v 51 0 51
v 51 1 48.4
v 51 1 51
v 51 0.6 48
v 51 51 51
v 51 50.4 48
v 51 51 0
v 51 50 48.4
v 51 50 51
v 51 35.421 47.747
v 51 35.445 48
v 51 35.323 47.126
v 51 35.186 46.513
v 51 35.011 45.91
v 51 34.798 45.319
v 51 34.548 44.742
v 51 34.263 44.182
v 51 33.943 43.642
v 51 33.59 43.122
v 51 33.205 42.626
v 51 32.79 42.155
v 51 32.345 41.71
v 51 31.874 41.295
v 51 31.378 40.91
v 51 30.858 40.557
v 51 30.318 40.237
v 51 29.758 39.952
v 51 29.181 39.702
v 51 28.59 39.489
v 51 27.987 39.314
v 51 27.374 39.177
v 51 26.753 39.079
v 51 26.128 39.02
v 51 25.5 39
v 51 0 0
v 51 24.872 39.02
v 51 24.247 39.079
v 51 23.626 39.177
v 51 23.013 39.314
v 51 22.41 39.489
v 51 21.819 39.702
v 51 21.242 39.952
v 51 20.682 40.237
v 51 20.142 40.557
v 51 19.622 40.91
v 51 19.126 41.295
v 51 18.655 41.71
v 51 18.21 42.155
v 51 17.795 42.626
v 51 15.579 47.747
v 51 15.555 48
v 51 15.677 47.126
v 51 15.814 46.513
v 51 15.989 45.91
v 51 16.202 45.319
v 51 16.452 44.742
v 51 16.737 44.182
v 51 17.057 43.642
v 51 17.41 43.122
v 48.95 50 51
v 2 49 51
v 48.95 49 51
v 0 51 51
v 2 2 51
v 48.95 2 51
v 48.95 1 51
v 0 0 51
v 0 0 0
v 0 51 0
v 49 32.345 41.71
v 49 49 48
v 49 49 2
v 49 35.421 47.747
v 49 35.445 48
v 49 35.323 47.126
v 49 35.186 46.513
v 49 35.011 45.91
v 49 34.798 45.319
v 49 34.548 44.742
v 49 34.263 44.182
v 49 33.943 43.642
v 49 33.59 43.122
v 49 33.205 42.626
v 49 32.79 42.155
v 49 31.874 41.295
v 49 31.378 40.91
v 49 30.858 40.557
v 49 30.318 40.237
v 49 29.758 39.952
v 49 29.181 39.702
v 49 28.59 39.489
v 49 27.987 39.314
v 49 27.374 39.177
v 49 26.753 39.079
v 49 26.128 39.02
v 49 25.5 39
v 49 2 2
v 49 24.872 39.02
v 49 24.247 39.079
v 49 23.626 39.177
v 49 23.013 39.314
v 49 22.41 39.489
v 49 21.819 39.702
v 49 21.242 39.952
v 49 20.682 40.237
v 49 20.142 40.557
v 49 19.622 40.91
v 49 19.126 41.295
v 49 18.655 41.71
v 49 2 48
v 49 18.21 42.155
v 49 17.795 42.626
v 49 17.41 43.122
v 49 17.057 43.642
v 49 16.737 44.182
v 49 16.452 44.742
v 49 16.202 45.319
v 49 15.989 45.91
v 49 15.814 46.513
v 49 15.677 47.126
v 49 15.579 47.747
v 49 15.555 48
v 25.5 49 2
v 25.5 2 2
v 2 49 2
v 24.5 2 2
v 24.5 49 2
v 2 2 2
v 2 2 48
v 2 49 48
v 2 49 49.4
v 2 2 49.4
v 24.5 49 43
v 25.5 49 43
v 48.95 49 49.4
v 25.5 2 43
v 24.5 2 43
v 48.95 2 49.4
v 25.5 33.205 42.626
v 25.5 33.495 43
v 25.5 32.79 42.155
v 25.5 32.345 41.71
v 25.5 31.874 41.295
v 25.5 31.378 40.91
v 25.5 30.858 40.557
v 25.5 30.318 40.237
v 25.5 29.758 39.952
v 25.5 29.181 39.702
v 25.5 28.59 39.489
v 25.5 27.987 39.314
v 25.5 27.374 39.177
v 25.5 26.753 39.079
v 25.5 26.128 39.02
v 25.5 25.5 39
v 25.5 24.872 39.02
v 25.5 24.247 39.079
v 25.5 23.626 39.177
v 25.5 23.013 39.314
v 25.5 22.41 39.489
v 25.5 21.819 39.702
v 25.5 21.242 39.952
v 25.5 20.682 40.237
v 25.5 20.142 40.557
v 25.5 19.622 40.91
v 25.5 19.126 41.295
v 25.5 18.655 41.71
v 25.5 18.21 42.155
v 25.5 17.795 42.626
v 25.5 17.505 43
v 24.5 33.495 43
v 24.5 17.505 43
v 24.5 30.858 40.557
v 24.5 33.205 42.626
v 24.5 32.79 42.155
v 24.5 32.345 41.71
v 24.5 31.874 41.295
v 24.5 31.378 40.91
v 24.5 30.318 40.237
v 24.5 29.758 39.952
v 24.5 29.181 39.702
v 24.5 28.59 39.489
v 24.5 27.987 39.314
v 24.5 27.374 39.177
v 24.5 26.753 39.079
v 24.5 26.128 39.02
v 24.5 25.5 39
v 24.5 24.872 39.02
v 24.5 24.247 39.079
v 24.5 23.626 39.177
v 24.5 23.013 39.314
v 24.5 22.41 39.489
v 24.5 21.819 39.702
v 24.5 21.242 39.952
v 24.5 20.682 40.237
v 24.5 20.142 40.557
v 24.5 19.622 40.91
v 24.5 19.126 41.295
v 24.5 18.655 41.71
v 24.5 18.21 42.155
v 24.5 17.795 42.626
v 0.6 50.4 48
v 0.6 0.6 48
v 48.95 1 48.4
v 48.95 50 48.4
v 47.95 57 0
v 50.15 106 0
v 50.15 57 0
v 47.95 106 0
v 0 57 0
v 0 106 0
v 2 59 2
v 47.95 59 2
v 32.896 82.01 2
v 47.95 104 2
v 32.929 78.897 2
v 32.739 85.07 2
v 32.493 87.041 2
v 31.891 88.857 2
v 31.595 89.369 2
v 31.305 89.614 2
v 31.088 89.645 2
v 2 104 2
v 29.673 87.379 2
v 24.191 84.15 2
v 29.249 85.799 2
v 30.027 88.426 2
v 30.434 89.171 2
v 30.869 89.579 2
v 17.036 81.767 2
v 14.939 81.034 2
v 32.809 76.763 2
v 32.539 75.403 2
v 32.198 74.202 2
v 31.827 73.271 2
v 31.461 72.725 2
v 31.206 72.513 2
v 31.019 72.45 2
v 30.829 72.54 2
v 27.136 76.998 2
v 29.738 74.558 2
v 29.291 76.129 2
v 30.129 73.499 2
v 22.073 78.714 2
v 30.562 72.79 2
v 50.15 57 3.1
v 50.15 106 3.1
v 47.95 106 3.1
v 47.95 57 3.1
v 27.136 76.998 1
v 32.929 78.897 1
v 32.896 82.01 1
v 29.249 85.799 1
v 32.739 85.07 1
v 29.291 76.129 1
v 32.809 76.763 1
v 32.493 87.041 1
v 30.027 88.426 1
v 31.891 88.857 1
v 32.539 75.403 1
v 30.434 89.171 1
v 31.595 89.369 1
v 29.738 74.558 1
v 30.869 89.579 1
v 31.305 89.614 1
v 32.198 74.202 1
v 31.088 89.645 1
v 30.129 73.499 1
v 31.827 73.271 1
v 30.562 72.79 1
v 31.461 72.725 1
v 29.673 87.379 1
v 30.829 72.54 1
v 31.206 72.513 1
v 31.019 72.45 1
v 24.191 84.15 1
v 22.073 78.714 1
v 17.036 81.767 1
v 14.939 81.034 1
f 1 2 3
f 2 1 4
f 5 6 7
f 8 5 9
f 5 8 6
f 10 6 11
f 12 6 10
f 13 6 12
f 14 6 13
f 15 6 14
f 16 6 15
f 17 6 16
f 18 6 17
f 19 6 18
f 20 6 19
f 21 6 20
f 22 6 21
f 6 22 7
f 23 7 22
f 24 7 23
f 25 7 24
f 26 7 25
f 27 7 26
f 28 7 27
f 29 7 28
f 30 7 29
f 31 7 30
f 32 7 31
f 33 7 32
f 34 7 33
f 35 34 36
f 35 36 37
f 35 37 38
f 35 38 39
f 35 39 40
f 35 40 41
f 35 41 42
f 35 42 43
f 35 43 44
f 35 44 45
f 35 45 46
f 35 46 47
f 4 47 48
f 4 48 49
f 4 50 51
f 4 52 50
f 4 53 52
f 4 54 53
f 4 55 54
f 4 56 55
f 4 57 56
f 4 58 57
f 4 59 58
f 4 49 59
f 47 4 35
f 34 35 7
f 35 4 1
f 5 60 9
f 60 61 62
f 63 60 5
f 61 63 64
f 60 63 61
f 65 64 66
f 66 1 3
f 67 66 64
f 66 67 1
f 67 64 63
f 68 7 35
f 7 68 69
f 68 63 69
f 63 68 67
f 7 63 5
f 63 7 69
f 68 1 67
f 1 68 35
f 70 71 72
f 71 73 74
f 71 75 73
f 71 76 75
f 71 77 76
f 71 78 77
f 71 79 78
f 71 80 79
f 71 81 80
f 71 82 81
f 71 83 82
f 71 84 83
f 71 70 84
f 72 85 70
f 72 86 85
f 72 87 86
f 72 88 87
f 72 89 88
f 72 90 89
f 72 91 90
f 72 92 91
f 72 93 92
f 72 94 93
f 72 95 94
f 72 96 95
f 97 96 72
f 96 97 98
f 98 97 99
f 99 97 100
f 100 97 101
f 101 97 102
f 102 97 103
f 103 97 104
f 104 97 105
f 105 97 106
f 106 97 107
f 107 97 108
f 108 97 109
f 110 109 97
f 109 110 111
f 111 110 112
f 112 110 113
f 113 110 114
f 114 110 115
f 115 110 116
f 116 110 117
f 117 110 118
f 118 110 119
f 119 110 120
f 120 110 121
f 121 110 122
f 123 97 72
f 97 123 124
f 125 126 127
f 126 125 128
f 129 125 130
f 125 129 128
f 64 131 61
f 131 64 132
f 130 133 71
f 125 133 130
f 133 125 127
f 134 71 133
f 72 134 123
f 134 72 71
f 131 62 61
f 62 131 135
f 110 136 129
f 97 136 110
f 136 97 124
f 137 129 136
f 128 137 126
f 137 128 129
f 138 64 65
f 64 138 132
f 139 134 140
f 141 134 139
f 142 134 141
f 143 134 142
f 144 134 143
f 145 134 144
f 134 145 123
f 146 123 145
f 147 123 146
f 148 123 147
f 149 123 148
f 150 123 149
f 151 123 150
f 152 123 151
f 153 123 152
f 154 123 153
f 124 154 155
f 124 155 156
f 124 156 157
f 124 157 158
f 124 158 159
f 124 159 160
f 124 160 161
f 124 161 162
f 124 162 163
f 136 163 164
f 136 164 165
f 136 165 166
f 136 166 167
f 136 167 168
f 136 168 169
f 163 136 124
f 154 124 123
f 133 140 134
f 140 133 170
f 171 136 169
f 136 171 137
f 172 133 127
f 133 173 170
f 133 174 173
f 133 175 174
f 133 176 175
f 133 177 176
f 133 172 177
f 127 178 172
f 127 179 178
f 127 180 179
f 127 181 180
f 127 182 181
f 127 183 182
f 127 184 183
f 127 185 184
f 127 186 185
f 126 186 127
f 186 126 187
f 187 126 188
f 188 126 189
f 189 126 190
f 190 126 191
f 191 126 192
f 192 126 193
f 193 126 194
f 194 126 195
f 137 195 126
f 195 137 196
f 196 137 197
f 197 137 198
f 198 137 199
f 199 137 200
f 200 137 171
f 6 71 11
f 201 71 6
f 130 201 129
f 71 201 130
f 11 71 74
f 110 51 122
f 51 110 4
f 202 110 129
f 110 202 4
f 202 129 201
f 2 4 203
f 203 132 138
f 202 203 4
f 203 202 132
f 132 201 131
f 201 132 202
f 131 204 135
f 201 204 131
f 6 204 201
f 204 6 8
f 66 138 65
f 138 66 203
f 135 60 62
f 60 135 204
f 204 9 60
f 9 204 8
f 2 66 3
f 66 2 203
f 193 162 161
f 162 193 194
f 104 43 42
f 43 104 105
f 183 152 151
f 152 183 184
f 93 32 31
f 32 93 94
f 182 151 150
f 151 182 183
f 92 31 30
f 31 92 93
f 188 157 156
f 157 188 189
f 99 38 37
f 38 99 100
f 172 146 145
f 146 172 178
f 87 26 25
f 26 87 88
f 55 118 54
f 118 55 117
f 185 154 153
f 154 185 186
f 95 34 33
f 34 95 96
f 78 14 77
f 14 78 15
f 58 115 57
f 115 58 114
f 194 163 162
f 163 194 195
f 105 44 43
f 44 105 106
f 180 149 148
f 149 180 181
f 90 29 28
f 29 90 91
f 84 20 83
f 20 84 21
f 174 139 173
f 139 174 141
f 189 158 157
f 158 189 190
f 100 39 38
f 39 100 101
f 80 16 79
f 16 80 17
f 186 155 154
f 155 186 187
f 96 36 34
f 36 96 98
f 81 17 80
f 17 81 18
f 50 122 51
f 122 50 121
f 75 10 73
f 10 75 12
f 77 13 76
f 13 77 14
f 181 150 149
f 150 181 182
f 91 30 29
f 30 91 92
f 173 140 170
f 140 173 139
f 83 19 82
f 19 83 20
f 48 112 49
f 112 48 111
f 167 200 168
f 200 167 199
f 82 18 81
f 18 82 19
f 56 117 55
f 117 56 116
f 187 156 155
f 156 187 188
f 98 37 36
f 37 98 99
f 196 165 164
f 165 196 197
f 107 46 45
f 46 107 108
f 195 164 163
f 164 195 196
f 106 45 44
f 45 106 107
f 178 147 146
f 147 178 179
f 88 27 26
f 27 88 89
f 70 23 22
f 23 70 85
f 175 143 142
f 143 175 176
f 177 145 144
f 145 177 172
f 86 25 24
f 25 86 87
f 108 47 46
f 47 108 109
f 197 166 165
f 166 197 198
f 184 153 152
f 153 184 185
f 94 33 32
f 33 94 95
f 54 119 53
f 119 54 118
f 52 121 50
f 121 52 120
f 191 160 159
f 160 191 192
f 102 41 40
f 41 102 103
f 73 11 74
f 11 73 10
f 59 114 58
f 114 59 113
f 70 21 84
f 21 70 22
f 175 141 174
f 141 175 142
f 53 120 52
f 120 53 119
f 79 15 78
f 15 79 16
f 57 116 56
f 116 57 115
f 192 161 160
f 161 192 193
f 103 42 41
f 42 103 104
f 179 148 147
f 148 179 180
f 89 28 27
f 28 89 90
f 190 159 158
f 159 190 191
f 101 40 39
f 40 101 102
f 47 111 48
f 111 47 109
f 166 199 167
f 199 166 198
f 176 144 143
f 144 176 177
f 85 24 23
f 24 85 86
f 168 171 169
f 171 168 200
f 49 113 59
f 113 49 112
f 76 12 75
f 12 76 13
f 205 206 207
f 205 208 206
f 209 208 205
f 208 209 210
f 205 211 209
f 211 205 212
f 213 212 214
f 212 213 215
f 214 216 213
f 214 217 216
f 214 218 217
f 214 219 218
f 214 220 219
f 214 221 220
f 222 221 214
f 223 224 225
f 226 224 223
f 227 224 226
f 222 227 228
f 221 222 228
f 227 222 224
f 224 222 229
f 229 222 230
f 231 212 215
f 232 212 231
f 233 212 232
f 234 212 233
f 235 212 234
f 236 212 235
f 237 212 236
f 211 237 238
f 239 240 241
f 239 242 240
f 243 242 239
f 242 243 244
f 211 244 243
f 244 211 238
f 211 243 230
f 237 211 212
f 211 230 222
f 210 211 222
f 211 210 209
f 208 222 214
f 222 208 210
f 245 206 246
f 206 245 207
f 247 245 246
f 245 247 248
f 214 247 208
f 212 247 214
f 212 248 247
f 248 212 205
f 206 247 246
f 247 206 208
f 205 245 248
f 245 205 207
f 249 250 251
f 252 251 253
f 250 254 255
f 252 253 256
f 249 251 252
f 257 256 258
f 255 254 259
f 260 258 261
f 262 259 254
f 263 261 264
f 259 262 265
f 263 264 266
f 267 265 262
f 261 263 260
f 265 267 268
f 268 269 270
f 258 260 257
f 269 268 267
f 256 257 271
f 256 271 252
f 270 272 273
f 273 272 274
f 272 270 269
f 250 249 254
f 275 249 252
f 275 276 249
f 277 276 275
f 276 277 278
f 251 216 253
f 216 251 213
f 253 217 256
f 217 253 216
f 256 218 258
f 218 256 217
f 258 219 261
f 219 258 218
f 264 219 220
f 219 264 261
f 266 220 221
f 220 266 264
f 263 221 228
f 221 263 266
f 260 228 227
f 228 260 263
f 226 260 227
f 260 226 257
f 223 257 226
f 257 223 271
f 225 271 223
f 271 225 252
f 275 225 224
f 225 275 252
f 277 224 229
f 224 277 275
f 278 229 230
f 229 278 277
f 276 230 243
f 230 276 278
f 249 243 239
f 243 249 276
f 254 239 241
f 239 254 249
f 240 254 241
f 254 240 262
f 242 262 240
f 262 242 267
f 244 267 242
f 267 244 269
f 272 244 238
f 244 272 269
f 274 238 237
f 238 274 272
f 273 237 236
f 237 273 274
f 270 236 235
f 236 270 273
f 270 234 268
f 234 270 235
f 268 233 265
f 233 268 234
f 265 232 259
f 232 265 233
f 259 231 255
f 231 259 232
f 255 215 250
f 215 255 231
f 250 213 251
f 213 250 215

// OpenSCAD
// file: carcassonne_box.scad
/**
 * @file carcassonne_box.scad
 * @author Conlan Wesson
 * Template for Carcossonne boxes.
 * @copyright Creative Commons Attribution-NonCommercial-ShareAlike 4.0
 */

mm = 1;
cm = 10*mm;

width = 47*mm;
thick = 2.5*mm;
wall = 2*mm;

/**
 * Lid for box.
 * @param count Number of cards.
 * @param columns Number of columns.
 * @param icon Path to icon DXF file.
 * @param rot Icon rotation in degrees.
 * @param mult Icon scale.
 * @param xoff X-offset of icon from center.
 * @param yoff Y-offset of icon from center.
 */
module carcassonne_lid(count, columns=1, icon=false, rot=0, mult=1, xoff=0, yoff=0, g=0){
	length = (thick * count) + ((width/2) - ((thick * count) % (width/2)));
	w = length+(1.5*wall)+.1;
	l = (width*columns)+wall;
	h = wall;
	d = 2;

	CubePoints = [
		[ 0-g, 0-g,   0 ],  //0
		[ w+g, 0-g,   0 ],  //1
		[ w+g, l+g,   0 ],  //2
		[ 0-g, l+g,   0 ],  //3
		[   d,   d, h+g ],  //4
		[   w,   d, h+g ],  //5
		[   w, l-d, h+g ],  //6
		[   d, l-d, h+g ]   //7
	];
	
	CubeFaces = [
		[0,1,2,3],  // bottom
		[4,5,1,0],  // front
		[7,6,5,4],  // top
		[5,6,2,1],  // right
		[6,7,3,2],  // back
		[7,4,0,3]   // left
	];
	
	
	difference(){
		union(){
			polyhedron( CubePoints, CubeFaces );
			translate([w-wall-.15,0,0]) cube([wall+.2,l, (1.5*wall)+.1]);
		}
		if(icon){
			translate([w/2+xoff,l/3+yoff,h-(wall/2)]){
				linear_extrude(height=(wall)+.1){
					rotate(rot) scale(mult) import(icon);
				}
			}
		}
	}
}

/**
 * Carcassonne card box.
 * @param count Number of cards.
 * @param dividers Array of divider positions.
 * @param columns Number of columns.
 */
module carcassonne_box(count, dividers=[], columns=1){
	length = (thick * count) + ((width/2) - ((thick * count) % (width/2)));
	difference(){
		union(){
			difference(){
				// Outer walls
				cube([length+(2*wall), (width*columns)+(2*wall), width+(2*wall)]);
				// Cavity
				translate([wall, wall, wall]){
					cube([length, width*columns, (width+wall)+.1]);
				}
			}
			// Dividers
			for(col = [0:columns-1]){
				for(div = dividers[col]){
					translate([(div*(width/2))+(wall/2), width*col+wall, 0]) cube([wall/2, width, width-(2*wall)]);
				}
				if(col > 0){
					translate([0, width*col+(wall/2), 0]) cube([length+(2*wall), wall/2, width-(2*wall)]);
				}
			}
		}
		union(){
			// Notch
			for(col = [0:columns-1]){
				translate([wall, wall+(width*col), wall]){
					translate([0, width/2, width])
					rotate([0, 90, 0]){
						cylinder(r=10, h=length+(2*wall), $fn=100);
					}
				}
			}
			// Track
			translate([wall/2,wall/2,width+wall/2]) carcassonne_lid(count, columns, g=0.4);
		}
	}
}
// main file
/**
 * @file magewitch.scad
 * @author Conlan Wesson
 * Mage and Witch Carcossonne box.
 * @copyright Creative Commons Attribution-NonCommercial-ShareAlike 4.0
 */

include <carcassonne_box.scad>

count = 16;
dividers = [[1]];
columns = 1;

carcassonne_box(count, dividers, columns);
translate([0,width*columns+10,0]) carcassonne_lid(count, columns, icon="magewitch.dxf", rot=90, mult=0.6, xoff=10, yoff=-3);
